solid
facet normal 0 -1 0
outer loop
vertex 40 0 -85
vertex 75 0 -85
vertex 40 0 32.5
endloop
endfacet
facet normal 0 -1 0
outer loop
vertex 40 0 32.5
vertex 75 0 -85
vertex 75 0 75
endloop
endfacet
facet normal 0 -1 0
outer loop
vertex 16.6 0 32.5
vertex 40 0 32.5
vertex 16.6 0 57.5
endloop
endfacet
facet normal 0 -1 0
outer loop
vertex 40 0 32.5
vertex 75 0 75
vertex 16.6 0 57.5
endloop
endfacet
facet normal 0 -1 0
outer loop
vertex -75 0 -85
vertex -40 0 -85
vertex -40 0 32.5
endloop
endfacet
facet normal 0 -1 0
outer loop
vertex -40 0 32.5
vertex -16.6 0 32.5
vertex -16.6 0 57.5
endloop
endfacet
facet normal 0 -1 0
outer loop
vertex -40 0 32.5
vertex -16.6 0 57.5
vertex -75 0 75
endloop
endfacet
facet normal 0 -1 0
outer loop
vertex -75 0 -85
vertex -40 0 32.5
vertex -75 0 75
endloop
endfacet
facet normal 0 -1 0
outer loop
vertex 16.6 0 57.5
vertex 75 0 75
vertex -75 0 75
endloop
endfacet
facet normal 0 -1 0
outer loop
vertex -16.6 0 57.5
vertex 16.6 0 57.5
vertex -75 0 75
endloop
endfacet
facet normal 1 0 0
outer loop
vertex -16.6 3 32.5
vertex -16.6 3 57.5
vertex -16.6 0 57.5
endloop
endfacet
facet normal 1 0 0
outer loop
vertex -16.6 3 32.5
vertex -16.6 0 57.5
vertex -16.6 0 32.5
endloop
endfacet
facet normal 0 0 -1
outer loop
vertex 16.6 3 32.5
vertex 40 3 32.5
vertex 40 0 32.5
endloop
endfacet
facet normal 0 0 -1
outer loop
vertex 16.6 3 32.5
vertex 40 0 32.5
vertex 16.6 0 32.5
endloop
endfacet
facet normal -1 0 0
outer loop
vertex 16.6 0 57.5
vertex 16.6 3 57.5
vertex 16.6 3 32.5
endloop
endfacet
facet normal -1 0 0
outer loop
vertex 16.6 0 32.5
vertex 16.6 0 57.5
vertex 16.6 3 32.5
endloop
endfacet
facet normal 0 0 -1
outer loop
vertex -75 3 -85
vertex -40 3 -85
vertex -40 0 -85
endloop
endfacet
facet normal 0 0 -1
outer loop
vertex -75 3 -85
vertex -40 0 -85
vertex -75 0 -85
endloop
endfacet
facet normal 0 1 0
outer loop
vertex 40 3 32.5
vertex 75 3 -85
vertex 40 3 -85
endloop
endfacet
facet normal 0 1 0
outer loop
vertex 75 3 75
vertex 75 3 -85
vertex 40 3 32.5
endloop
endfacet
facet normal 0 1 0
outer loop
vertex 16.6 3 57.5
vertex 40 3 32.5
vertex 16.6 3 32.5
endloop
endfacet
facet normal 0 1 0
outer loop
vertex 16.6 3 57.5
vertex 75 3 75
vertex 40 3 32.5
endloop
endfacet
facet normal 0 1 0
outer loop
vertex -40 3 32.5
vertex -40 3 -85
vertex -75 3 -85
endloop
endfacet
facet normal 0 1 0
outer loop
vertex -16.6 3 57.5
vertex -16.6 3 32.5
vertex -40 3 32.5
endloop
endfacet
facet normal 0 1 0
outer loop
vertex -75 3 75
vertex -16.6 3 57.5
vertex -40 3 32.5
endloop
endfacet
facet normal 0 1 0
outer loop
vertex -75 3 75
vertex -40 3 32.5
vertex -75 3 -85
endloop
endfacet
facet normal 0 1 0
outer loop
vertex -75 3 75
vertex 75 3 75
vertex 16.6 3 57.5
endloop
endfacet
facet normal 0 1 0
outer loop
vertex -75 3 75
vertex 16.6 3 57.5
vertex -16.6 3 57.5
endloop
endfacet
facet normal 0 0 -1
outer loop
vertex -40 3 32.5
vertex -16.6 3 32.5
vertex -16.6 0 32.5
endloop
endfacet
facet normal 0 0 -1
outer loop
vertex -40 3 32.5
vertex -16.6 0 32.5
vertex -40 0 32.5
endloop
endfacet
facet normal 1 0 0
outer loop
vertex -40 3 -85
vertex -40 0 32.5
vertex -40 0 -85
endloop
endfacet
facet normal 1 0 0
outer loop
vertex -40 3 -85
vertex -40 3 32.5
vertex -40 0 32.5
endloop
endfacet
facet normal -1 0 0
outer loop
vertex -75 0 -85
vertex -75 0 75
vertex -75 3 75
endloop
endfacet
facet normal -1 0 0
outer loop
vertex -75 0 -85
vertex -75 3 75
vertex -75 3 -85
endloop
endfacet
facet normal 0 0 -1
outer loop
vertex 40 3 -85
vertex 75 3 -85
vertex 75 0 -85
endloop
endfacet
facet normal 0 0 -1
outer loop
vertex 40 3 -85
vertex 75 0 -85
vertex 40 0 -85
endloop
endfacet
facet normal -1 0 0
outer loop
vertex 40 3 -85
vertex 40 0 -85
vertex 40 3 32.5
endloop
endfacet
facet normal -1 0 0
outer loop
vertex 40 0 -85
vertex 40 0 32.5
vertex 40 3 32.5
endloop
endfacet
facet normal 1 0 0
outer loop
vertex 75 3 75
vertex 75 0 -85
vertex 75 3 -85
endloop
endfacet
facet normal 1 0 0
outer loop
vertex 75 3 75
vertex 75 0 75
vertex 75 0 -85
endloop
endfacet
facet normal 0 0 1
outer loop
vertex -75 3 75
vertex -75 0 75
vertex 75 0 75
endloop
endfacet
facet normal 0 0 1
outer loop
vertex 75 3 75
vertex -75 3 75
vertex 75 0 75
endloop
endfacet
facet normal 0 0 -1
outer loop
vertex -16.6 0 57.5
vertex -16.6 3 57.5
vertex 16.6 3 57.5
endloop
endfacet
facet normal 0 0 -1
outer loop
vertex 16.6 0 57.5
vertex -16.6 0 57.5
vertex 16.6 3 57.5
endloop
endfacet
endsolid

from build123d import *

# Parameters (mm, degrees)
SKETCH3_W           = 150
SKETCH3_H           = 150
BOSS_EXTRUDE1_DEPTH = 3
SKETCH4_W           = 80
SKETCH4_H           = 80
CUT_EXTRUDE1_DEPTH  = 3
SKETCH5_W           = 35
SKETCH5_H           = 3
BOSS_EXTRUDE2_DEPTH = 10
SKETCH7_W           = 80
SKETCH7_H           = 3
CUT_EXTRUDE2_DEPTH  = 27.5
SKETCH8_W           = 33.2
SKETCH8_H           = 25
CUT_EXTRUDE3_DEPTH  = 3


with BuildPart() as part:
    # Sketch3 → Boss-Extrude1 (new body)
    with BuildSketch(Plane(origin=(0, 0, 0), x_dir=(1, 0, 0), z_dir=(0, 1, 0))):
        Rectangle(SKETCH3_W, SKETCH3_H)
    extrude(amount=BOSS_EXTRUDE1_DEPTH)

    # Sketch4 → Cut-Extrude1 (cut)
    with BuildSketch(Plane(origin=(0, 3, 0), x_dir=(1, 0, 0), z_dir=(0, 1, 0))):
        with Locations((0, 35)):
            Rectangle(SKETCH4_W, SKETCH4_H)
    extrude(amount=-CUT_EXTRUDE1_DEPTH, mode=Mode.SUBTRACT)

    # Sketch5 → Boss-Extrude2 (add)
    with BuildSketch(Plane(origin=(0, 0, -75), x_dir=(-1, 0, 0), z_dir=(0, 0, -1))):
        with Locations((-57.5, 1.5)):
            Rectangle(SKETCH5_W, SKETCH5_H)
        with Locations((57.5, 1.5)):
            Rectangle(SKETCH5_W, SKETCH5_H)
    extrude(amount=BOSS_EXTRUDE2_DEPTH)

    # Sketch7 → Cut-Extrude2 (cut)
    with BuildSketch(Plane(origin=(0, 0, 5), x_dir=(-1, 0, 0), z_dir=(0, 0, -1))):
        with Locations((0, 1.5)):
            Rectangle(SKETCH7_W, SKETCH7_H)
    extrude(amount=-CUT_EXTRUDE2_DEPTH, mode=Mode.SUBTRACT)

    # Sketch8 → Cut-Extrude3 (cut)
    with BuildSketch(Plane(origin=(0, 3, 0), x_dir=(1, 0, 0), z_dir=(0, 1, 0))):
        with Locations((0, -45)):
            Rectangle(SKETCH8_W, SKETCH8_H)
    extrude(amount=-CUT_EXTRUDE3_DEPTH, mode=Mode.SUBTRACT)


solid = part.part
